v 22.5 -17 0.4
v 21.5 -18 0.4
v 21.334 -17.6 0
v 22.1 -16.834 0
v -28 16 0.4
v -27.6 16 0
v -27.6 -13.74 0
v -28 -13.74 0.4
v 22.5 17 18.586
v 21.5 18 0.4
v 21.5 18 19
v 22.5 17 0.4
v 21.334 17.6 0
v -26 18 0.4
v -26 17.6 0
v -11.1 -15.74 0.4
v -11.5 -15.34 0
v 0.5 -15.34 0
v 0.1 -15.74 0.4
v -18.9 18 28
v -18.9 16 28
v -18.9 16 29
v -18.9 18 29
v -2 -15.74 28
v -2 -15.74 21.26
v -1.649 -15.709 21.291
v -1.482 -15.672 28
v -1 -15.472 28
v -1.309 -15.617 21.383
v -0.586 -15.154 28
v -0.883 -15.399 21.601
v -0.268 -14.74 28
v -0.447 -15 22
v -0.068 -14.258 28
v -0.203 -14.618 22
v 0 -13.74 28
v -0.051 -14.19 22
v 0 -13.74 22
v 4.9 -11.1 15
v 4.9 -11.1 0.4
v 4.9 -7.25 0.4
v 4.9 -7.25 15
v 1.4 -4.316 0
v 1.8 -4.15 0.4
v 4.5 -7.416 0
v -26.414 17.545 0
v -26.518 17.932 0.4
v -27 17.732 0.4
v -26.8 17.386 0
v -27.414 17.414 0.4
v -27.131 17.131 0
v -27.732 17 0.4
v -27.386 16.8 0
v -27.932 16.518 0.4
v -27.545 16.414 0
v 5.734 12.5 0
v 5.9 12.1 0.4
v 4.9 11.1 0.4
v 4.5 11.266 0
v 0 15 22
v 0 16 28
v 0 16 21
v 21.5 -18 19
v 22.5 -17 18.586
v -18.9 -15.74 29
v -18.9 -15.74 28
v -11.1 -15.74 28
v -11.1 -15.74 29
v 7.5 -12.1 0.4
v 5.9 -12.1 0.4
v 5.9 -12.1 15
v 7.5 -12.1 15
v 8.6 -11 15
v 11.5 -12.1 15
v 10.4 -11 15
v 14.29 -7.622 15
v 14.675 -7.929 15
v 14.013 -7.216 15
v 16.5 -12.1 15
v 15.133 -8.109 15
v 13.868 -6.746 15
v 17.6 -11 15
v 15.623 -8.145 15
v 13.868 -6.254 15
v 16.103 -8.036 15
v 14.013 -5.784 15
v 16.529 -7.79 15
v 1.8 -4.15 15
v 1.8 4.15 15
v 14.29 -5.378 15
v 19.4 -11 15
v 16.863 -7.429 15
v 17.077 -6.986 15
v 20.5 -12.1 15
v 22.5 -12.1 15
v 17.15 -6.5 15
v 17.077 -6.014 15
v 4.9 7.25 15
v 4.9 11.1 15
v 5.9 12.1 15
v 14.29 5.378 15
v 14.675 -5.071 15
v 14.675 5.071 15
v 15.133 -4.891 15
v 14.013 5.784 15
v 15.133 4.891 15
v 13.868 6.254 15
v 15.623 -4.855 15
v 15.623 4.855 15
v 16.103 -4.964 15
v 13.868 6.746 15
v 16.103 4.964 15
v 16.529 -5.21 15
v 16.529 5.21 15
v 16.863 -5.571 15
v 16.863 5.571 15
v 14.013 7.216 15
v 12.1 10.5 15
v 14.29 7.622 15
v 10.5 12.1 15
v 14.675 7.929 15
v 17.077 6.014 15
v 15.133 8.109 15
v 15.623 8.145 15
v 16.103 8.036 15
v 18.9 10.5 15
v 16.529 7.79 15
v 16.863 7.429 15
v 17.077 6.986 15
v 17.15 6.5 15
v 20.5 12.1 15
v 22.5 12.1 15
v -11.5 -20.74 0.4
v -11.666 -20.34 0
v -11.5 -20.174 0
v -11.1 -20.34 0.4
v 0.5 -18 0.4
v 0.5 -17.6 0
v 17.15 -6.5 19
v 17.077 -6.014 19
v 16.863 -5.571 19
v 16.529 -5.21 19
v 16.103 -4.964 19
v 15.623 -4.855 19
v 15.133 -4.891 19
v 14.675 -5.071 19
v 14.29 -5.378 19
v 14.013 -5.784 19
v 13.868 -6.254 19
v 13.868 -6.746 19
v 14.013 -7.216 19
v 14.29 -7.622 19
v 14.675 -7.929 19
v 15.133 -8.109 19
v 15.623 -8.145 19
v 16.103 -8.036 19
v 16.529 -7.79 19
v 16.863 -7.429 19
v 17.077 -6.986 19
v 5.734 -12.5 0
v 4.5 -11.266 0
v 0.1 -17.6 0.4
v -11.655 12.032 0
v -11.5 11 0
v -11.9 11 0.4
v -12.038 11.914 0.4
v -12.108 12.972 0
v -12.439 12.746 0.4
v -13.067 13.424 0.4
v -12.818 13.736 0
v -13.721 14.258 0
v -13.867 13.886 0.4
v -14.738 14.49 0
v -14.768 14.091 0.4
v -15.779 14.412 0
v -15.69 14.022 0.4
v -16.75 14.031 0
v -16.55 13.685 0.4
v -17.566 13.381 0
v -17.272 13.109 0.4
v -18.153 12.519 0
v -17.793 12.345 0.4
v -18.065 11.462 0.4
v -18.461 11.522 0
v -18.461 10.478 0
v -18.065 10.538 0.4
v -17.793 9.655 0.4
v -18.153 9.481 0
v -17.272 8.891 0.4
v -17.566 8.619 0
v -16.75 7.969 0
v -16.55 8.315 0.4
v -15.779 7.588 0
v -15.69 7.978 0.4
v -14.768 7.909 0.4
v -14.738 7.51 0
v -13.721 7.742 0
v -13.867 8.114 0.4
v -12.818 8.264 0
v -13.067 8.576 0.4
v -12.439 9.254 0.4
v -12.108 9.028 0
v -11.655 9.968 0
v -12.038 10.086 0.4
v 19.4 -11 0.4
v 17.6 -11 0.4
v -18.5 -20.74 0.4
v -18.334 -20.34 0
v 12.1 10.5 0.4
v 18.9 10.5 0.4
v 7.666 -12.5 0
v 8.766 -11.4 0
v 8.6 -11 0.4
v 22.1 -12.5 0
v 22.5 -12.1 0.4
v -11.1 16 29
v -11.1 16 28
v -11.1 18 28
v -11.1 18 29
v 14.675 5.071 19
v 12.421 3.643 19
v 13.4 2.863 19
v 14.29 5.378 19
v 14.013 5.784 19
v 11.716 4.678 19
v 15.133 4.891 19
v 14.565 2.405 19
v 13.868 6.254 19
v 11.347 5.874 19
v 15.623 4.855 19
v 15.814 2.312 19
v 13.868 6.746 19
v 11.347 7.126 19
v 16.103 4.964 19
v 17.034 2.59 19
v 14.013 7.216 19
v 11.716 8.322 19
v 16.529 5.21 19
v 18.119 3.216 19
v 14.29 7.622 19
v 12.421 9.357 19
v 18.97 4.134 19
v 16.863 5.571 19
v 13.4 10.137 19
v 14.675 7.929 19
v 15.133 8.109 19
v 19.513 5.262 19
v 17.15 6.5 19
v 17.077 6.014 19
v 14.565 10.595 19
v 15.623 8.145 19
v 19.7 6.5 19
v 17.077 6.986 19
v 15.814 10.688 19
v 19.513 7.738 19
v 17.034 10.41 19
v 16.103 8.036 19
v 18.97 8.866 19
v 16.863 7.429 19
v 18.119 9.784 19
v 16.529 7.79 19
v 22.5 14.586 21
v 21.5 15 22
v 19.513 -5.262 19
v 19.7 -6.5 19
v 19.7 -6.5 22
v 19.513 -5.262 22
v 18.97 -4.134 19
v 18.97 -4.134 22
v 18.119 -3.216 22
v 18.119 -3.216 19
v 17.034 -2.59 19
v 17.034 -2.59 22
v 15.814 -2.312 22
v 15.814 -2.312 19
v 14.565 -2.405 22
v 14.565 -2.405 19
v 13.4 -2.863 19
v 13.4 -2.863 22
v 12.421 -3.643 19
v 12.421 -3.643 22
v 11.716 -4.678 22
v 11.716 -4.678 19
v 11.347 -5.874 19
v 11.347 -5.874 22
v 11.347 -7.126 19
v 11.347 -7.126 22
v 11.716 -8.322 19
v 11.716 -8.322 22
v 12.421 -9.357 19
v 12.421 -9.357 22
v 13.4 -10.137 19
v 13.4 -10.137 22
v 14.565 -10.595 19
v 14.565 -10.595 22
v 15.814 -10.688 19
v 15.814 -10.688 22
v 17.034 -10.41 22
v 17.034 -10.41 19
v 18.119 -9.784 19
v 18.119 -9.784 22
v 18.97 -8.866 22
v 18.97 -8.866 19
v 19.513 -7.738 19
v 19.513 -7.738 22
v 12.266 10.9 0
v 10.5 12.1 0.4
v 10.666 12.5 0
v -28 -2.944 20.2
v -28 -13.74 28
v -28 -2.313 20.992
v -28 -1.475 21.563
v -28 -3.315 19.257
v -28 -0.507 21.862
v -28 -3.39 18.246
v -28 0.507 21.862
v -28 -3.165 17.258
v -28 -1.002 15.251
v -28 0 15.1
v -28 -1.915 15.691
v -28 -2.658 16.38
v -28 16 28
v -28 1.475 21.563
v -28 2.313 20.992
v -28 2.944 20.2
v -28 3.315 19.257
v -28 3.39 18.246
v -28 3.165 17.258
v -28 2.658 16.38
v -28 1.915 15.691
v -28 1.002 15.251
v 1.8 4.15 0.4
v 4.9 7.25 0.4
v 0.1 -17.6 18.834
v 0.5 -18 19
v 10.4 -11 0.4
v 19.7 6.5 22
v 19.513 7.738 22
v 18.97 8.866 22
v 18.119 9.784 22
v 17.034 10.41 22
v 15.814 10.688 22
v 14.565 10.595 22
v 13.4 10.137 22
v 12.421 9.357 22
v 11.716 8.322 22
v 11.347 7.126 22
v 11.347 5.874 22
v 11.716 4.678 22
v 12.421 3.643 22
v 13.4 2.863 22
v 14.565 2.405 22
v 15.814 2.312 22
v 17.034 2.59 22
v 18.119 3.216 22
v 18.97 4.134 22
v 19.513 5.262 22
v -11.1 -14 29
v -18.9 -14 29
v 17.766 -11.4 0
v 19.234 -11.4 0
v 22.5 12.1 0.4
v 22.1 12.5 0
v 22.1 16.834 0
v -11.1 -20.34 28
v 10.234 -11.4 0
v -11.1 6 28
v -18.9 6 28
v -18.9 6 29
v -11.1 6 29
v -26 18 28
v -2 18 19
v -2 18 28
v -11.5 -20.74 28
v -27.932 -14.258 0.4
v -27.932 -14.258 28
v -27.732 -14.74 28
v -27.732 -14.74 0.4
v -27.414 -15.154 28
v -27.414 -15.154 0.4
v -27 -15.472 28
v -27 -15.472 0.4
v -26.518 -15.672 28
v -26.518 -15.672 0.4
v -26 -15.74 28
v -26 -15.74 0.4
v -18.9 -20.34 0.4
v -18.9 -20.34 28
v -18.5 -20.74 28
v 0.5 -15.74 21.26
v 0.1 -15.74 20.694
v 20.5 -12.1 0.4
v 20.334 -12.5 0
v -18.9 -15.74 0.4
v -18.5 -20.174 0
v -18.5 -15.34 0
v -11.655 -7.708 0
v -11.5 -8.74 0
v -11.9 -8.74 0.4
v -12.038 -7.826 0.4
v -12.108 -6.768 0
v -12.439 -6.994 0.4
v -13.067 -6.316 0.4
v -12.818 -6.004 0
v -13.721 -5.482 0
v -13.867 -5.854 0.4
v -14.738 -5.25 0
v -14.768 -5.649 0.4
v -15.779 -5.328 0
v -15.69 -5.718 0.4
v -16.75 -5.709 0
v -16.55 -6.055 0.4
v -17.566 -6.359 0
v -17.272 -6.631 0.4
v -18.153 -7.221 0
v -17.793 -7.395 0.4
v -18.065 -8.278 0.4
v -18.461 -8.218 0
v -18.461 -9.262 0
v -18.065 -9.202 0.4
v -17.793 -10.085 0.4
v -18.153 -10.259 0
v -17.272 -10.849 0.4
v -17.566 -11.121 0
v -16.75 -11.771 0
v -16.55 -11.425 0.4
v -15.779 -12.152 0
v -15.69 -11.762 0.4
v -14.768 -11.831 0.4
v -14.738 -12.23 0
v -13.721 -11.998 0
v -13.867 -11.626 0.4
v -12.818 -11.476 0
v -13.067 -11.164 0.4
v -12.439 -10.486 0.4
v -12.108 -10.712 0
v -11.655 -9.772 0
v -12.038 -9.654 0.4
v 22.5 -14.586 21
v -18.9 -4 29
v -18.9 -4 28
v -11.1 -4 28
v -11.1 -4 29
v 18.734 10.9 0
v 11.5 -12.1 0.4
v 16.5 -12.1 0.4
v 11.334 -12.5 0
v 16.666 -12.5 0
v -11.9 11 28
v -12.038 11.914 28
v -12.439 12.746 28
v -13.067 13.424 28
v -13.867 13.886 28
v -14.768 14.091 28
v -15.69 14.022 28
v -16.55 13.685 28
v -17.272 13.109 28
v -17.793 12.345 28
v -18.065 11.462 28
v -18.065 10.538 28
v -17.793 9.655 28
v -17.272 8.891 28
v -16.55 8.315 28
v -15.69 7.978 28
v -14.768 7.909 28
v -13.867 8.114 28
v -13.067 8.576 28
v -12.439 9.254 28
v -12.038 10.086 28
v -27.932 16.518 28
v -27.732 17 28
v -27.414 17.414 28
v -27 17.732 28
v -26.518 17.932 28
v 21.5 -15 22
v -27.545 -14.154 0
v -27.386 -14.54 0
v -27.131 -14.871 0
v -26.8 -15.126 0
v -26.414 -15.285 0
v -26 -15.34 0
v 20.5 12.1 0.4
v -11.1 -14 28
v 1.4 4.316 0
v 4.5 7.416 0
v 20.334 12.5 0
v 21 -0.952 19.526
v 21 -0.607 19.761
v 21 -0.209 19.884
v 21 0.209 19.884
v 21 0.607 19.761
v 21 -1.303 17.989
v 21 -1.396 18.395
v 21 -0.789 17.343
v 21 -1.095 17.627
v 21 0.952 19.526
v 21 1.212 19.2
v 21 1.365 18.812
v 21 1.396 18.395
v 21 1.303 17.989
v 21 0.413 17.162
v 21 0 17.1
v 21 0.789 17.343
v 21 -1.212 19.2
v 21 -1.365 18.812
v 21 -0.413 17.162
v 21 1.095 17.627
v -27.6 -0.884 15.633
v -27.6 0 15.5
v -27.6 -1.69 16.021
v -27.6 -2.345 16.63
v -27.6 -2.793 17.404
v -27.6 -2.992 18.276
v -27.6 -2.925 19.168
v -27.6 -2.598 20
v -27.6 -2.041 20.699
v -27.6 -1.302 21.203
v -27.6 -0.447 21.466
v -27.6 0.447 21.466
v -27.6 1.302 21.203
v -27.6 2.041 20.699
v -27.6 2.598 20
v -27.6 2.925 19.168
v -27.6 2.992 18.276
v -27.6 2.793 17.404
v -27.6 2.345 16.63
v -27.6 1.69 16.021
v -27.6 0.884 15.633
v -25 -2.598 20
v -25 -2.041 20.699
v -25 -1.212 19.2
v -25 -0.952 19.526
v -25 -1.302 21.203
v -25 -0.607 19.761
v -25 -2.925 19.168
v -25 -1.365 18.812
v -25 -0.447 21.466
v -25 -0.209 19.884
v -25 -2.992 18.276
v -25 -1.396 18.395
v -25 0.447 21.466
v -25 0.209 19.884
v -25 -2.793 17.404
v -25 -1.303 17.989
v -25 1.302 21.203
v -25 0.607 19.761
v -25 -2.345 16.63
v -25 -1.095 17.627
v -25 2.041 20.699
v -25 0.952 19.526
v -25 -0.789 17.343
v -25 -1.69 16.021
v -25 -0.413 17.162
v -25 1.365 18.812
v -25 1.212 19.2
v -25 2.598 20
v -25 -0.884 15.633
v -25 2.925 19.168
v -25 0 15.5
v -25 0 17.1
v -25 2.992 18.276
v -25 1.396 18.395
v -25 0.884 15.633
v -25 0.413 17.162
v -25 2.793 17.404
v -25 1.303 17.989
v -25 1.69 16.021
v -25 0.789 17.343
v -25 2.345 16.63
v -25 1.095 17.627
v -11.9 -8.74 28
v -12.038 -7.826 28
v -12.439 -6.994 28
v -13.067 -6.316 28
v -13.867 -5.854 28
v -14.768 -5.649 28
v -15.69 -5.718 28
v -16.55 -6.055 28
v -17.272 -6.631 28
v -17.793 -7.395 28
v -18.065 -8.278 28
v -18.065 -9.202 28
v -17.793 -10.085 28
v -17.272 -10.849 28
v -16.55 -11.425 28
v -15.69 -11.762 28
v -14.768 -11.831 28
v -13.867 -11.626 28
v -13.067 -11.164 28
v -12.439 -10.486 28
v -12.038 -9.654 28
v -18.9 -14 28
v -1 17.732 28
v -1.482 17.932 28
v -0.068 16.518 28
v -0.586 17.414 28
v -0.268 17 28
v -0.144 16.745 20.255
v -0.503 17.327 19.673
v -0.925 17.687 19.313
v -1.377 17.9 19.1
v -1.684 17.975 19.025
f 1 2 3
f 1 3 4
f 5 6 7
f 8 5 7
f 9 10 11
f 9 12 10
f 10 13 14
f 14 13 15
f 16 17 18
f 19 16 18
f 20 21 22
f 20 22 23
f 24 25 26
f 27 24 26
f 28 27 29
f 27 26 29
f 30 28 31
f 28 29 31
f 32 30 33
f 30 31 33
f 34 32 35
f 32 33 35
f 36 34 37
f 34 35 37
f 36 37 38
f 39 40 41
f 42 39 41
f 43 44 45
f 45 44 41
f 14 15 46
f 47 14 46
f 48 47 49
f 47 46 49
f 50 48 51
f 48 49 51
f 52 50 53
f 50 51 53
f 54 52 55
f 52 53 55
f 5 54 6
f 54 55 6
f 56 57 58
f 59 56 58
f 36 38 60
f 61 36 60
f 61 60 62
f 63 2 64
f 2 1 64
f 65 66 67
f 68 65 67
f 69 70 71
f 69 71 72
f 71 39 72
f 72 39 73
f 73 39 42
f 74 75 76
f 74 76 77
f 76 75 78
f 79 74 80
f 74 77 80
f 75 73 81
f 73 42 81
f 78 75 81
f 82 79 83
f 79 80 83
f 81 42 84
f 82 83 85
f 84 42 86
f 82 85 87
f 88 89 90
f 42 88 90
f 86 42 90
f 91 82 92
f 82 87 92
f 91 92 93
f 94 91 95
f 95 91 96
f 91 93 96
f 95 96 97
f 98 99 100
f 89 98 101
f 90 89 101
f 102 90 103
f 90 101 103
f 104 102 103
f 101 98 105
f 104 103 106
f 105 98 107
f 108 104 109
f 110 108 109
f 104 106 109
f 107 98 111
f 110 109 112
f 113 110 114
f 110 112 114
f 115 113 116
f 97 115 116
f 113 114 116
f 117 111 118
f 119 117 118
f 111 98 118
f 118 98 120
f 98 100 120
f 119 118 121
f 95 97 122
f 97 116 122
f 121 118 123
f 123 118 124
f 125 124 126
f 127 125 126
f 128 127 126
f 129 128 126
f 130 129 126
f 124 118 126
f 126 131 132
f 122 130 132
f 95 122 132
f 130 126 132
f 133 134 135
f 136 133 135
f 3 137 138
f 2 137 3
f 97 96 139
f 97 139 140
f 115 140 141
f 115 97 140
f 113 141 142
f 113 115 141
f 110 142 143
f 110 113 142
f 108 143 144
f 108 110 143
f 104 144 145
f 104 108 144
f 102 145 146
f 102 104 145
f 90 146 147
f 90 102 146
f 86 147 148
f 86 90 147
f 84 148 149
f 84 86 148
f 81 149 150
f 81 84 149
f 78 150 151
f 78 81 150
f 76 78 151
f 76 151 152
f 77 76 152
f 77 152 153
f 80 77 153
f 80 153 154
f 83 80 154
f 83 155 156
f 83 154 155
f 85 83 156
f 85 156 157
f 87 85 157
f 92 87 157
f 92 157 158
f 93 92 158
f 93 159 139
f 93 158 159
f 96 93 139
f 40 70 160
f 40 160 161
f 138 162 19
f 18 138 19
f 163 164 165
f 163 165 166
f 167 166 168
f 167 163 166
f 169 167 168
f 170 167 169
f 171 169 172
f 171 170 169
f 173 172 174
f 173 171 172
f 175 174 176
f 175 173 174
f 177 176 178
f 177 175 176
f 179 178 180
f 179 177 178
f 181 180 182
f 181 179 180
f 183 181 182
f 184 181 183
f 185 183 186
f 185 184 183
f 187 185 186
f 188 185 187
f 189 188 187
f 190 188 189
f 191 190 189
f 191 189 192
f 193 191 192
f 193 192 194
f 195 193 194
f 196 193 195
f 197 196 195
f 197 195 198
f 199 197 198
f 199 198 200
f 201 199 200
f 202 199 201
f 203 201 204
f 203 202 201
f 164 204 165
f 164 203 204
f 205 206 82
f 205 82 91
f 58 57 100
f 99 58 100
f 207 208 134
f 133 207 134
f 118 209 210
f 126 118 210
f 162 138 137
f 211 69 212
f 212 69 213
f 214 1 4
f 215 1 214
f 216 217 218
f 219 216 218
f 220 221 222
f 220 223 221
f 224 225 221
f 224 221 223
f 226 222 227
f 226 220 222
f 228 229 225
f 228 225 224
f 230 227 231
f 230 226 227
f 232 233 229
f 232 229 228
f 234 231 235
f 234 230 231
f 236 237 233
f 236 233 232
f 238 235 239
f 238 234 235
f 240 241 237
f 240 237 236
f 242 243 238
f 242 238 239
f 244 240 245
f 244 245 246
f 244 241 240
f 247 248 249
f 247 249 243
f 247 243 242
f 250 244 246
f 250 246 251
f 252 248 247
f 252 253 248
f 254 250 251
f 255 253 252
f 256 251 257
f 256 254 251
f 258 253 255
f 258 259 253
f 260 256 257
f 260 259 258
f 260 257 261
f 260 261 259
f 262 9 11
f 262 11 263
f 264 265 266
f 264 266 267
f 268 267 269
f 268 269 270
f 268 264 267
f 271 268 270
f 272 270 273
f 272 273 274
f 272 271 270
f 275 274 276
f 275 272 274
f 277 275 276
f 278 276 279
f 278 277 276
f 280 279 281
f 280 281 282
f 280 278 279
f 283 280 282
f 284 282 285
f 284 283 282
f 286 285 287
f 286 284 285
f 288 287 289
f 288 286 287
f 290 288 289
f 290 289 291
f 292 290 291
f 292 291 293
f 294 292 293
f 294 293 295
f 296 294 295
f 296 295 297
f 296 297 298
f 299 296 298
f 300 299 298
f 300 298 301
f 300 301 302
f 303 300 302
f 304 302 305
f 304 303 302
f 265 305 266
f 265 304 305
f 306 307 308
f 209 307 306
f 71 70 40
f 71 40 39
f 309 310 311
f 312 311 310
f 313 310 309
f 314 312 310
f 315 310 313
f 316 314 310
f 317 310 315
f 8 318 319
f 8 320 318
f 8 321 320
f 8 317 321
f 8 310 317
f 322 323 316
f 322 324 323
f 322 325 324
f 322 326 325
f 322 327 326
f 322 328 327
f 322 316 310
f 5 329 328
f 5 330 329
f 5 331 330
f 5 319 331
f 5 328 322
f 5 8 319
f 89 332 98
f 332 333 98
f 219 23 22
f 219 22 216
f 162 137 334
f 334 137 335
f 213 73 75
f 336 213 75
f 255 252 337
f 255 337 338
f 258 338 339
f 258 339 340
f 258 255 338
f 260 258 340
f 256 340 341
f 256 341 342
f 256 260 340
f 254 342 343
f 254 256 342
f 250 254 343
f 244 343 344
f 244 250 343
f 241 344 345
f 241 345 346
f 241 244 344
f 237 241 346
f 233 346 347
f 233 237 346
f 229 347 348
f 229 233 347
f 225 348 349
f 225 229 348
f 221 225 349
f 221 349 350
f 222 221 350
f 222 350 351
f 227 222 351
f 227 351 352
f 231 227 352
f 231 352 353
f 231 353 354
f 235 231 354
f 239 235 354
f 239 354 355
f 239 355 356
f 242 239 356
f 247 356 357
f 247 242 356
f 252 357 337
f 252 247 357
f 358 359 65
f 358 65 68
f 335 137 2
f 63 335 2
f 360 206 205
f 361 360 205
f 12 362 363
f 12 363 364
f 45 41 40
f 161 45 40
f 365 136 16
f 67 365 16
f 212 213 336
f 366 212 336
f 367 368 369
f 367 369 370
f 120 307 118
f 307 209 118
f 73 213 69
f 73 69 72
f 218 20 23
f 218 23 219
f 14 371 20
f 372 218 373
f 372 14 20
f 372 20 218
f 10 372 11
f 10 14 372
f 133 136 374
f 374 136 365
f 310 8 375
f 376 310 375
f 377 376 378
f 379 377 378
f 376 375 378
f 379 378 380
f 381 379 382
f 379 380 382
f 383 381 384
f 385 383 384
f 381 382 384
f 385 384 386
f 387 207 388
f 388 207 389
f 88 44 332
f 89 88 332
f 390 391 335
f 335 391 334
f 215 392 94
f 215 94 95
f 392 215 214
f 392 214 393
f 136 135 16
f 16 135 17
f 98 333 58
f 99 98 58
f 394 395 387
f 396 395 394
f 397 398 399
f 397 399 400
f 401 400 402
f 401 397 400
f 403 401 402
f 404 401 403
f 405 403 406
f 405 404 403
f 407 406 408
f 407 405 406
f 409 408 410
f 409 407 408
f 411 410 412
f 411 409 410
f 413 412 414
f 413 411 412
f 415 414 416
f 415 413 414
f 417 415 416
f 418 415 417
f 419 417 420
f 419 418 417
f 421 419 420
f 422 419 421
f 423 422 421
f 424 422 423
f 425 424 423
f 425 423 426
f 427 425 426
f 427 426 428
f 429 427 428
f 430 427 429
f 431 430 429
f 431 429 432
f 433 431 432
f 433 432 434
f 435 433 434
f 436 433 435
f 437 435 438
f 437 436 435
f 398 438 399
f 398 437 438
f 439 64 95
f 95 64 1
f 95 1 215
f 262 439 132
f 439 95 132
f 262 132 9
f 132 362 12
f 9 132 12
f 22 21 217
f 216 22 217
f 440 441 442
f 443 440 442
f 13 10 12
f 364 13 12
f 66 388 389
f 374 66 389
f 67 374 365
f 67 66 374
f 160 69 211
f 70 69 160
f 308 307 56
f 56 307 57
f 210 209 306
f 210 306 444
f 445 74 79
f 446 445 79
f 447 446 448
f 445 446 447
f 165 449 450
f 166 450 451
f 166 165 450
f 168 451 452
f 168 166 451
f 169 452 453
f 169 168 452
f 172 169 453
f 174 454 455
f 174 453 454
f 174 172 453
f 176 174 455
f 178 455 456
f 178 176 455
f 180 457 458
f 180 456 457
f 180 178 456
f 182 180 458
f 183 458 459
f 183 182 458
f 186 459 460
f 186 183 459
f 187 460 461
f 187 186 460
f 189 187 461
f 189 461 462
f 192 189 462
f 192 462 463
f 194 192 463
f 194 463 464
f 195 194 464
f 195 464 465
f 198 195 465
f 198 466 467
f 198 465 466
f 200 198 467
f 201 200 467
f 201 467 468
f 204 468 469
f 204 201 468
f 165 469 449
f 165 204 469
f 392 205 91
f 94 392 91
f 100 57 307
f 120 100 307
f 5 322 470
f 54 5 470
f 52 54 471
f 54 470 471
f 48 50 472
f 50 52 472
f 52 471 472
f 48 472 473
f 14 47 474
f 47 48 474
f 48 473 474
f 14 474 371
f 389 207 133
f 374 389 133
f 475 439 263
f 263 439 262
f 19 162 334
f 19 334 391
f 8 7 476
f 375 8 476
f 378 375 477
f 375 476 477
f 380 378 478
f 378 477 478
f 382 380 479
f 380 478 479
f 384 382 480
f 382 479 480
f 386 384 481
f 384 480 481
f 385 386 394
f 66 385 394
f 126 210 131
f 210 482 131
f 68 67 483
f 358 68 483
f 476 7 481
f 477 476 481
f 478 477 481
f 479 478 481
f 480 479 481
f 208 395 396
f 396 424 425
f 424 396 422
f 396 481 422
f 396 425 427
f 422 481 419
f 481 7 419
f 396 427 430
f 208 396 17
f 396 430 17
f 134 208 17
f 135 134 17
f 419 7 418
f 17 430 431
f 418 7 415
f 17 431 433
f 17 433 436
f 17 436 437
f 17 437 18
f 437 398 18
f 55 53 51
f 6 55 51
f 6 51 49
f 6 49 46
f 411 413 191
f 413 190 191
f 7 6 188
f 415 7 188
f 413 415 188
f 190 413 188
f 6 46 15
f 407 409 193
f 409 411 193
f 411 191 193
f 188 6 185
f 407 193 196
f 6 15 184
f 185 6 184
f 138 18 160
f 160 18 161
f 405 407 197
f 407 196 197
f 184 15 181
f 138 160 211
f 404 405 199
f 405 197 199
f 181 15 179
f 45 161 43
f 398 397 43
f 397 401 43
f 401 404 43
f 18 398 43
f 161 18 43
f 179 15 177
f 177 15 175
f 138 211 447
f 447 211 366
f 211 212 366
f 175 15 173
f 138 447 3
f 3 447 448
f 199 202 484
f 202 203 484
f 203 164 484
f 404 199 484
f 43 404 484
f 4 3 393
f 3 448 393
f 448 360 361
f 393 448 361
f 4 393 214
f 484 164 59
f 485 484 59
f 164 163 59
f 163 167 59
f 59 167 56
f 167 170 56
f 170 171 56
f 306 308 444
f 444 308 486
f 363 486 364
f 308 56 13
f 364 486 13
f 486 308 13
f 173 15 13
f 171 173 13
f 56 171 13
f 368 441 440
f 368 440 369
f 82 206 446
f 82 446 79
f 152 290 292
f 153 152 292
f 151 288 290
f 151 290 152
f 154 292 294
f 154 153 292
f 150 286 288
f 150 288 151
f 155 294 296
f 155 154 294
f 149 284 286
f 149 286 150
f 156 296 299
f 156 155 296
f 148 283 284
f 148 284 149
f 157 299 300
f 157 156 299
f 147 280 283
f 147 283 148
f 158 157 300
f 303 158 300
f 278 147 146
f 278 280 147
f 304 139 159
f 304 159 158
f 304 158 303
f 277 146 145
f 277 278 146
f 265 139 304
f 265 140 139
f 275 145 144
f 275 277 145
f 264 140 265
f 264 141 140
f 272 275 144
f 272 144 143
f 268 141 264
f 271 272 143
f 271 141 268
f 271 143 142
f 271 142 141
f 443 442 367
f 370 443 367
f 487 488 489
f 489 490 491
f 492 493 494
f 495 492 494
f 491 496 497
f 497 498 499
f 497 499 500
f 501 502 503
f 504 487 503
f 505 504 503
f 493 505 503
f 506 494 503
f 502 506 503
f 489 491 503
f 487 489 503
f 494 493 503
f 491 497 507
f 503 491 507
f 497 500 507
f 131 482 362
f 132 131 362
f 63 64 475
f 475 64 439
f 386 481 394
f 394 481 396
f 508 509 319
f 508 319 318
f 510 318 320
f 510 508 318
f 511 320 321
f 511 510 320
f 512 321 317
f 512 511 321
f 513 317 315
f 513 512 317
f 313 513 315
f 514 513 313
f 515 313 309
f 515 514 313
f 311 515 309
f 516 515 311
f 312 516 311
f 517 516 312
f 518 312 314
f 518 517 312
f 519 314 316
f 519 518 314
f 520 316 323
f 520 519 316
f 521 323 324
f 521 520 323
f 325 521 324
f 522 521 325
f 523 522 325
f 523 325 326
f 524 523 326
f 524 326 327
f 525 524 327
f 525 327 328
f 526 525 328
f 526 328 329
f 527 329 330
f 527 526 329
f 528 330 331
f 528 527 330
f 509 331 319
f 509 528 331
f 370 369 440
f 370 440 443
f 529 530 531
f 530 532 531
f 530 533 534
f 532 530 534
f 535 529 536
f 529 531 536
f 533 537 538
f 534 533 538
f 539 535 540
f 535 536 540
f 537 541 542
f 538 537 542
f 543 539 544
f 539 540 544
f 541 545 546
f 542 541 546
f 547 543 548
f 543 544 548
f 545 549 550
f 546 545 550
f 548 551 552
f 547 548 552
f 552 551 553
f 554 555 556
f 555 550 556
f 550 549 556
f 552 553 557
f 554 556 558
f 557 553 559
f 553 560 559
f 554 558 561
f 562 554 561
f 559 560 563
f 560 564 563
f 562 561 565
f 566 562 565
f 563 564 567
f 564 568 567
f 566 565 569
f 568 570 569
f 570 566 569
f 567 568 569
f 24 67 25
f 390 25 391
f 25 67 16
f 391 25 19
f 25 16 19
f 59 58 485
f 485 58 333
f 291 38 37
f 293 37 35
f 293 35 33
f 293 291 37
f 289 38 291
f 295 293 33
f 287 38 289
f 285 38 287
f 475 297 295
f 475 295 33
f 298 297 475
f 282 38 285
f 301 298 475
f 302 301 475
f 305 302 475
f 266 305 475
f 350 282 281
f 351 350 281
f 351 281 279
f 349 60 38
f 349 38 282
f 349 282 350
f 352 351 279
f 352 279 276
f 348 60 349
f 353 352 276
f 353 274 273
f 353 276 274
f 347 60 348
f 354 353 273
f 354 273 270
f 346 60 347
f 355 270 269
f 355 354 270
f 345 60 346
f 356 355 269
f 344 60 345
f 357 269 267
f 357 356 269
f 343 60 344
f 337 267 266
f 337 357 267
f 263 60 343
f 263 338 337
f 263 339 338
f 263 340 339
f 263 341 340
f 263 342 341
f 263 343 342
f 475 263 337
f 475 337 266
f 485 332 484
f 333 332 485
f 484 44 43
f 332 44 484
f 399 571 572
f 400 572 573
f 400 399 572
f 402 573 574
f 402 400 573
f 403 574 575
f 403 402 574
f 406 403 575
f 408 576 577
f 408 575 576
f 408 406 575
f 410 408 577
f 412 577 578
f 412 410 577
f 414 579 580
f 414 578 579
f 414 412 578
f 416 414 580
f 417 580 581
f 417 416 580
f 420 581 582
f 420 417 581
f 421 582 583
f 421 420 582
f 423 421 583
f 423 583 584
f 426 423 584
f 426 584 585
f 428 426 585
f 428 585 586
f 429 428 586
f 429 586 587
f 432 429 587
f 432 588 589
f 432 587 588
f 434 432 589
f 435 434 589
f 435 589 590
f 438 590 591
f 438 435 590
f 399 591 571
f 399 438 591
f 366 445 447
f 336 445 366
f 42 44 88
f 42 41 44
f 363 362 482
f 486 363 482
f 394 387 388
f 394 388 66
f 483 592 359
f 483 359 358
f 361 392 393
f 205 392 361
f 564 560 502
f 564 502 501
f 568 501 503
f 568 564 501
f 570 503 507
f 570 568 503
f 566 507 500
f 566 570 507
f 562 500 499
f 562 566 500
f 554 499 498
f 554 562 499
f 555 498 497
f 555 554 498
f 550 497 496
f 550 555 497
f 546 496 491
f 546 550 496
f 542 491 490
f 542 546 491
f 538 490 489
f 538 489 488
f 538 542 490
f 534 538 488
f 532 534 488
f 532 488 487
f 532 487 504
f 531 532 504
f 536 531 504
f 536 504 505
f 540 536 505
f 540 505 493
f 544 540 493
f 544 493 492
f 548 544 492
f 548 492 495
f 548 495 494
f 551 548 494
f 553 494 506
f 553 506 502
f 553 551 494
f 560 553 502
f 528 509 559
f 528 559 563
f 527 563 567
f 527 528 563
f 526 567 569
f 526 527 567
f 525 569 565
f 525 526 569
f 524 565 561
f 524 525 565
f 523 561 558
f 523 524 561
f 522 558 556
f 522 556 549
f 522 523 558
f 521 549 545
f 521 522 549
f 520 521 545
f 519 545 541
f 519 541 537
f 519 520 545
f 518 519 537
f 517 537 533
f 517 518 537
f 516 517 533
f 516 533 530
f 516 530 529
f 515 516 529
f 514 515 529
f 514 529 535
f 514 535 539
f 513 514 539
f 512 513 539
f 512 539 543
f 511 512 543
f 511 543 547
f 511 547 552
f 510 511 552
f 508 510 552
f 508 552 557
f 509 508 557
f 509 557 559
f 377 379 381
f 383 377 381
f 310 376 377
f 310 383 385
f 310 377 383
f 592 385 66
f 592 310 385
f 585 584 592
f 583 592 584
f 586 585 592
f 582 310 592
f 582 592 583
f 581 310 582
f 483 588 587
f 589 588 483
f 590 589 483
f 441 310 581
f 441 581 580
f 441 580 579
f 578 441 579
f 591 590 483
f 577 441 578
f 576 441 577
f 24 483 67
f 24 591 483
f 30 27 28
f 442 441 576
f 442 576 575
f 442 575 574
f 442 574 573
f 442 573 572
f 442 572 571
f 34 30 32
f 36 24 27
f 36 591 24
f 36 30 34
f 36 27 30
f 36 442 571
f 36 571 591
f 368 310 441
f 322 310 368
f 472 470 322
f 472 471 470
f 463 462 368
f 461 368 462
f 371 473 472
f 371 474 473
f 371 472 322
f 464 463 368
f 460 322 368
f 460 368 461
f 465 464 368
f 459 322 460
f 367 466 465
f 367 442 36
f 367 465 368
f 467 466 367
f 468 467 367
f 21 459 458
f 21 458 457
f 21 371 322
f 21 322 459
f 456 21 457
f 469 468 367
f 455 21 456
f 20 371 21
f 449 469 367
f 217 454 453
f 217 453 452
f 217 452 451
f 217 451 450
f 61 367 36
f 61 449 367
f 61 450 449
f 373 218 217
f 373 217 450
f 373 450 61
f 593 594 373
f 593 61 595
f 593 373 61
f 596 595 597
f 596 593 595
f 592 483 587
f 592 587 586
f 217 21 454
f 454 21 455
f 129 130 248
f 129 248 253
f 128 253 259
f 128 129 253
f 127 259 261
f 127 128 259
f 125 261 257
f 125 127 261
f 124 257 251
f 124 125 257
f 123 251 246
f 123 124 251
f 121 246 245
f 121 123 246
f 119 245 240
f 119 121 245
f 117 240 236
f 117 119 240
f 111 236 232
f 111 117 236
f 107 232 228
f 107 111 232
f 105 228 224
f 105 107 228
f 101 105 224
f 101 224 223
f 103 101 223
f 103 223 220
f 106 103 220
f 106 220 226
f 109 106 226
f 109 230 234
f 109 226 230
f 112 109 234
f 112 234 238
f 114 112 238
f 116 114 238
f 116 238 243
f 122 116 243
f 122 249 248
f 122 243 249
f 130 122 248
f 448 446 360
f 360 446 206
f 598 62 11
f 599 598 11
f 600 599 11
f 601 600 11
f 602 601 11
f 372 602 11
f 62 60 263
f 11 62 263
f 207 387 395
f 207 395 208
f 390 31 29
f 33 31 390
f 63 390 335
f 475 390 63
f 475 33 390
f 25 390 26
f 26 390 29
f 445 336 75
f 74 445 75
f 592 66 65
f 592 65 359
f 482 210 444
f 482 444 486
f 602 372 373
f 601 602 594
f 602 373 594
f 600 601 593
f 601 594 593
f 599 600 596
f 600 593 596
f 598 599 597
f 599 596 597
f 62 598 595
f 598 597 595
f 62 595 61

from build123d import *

# Parameters (mm, degrees)
BOX039_W                 = 10
BOX039_H                 = 10
BOX039_DEPTH             = 10
BOX040_W                 = 10
BOX040_H                 = 10
BOX040_DEPTH             = 10
CYLINDER027_R            = 1.4
CYLINDER027_DEPTH        = 46
CYLINDER028_R            = 3
CYLINDER028_DEPTH        = 4
CYLINDER026_R            = 3.1
CYLINDER026_DEPTH        = 32
CYLINDER_R               = 3.1
CYLINDER_DEPTH           = 32
BOX035_W                 = 7.8
BOX035_H                 = 6
BOX035_DEPTH             = 28
CHAMFER003068008_SIZE    = 0.4
BOX031_W                 = 7.8
BOX031_H                 = 11.74
BOX031_DEPTH             = 1
BOX032_W                 = 7.8
BOX032_H                 = 3
BOX032_DEPTH             = 1
BOX030_W                 = 7.8
BOX030_H                 = 3
BOX030_DEPTH             = 1
BOX033_W                 = 60
BOX033_H                 = 10
BOX033_DEPTH             = 30
BOX_W                    = 28
BOX_H                    = 36
BOX_DEPTH                = 28
FILLET_R                 = 2
BOX038_W                 = 4
BOX038_H                 = 14.5
BOX038_DEPTH             = 15
CHAMFER003068009_SIZE    = 3.1
BOX034_W                 = 10
BOX034_H                 = 10
BOX034_DEPTH             = 28
CYLINDER024_R            = 1.65
CYLINDER024_DEPTH        = 10
CYLINDER025_R            = 1.65
CYLINDER025_DEPTH        = 10
CYLINDER023_R            = 4.2
CYLINDER023_DEPTH        = 3
CYLINDER022_R            = 4.2
CYLINDER022_DEPTH        = 3
BOX027_W                 = 13
BOX027_H                 = 10
BOX027_DEPTH             = 19
BOX021_W                 = 10
BOX021_H                 = 3
BOX021_DEPTH             = 15
BOX022_W                 = 4
BOX022_H                 = 3
BOX022_DEPTH             = 15
BOX026_W                 = 4
BOX026_H                 = 3
BOX026_DEPTH             = 15
CHAMFER003060_SIZE       = 1.6
BOX015_W                 = 22.2
BOX015_H                 = 24.2
BOX015_DEPTH             = 18
CHAMFER003042_SIZE       = 1
BOX018_W                 = 22.5
BOX018_H                 = 36
BOX018_DEPTH             = 22
CHAMFER_SIZE             = 3
CHAMFER003061_SIZE       = 1
BOX029_W                 = 3
BOX029_H                 = 36
BOX029_DEPTH             = 22
CHAMFER003062_SIZE       = 3
CHAMFER003068012002_SIZE = 0.4


with BuildPart() as cube037:
    # Box039 → Box039 (new body)
    with BuildSketch(Plane(origin=(-20, 6, 28), x_dir=(1, 0, 0), z_dir=(0, 0, 1))):
        with Locations((5, 5)):
            Rectangle(BOX039_W, BOX039_H)
    extrude(amount=BOX039_DEPTH)


with BuildPart() as fusion013005011029006008001011:
    # Box040 → Box040 (new body)
    with BuildSketch(Plane(origin=(-20, -14, 28), x_dir=(1, 0, 0), z_dir=(0, 0, 1))):
        with Locations((5, 5)):
            Rectangle(BOX040_W, BOX040_H)
    extrude(amount=BOX040_DEPTH)

    # Fusion013005011029006008001011: union Cube037
    add(cube037.part)


with BuildPart() as cylinder027:
    # Cylinder027 → Cylinder027 (new body)
    with BuildSketch(Plane(origin=(-25, 0, 18.5), x_dir=(0, 0, -1), z_dir=(1, 0, 0))):
        Circle(CYLINDER027_R)
    extrude(amount=CYLINDER027_DEPTH)


with BuildPart() as fusion013005011029006008001010:
    # Cylinder028 → Cylinder028 (new body)
    with BuildSketch(Plane(origin=(-29, 0, 18.5), x_dir=(0, 0, -1), z_dir=(1, 0, 0))):
        Circle(CYLINDER028_R)
    extrude(amount=CYLINDER028_DEPTH)

    # Fusion013005011029006008001010: union Cylinder027
    add(cylinder027.part)


with BuildPart() as cylinder026:
    # Cylinder026 → Cylinder026 (new body)
    with BuildSketch(Plane(origin=(-15, -8.74, 0), x_dir=(1, 0, 0), z_dir=(0, 0, 1))):
        Circle(CYLINDER026_R)
    extrude(amount=CYLINDER026_DEPTH)


with BuildPart() as fusion013005011029006006:
    # Cylinder → Cylinder (new body)
    with BuildSketch(Plane(origin=(-15, 11, 0), x_dir=(1, 0, 0), z_dir=(0, 0, 1))):
        Circle(CYLINDER_R)
    extrude(amount=CYLINDER_DEPTH)

    # Fusion013005011029006006: union Cylinder026
    add(cylinder026.part)


with BuildPart() as chamfer003068008:
    # Box035 → Box035 (new body)
    with BuildSketch(Plane(origin=(-18.9, -20.74, 0), x_dir=(1, 0, 0), z_dir=(0, 0, 1))):
        with Locations((3.9, 3)):
            Rectangle(BOX035_W, BOX035_H)
    extrude(amount=BOX035_DEPTH)

    # Chamfer003068008
    chamfer003068008_edges = [chamfer003068008.edges().sort_by_distance(p)[0] for p in [
        (-18.9, -20.74, 14),
        (-11.1, -20.74, 14),
    ]]
    chamfer(chamfer003068008_edges, length=CHAMFER003068008_SIZE)


with BuildPart() as cube029:
    # Box031 → Box031 (new body)
    with BuildSketch(Plane(origin=(-18.9, -4.74, 25), x_dir=(1, 0, 0), z_dir=(0, 0, 1))):
        with Locations((3.9, 5.87)):
            Rectangle(BOX031_W, BOX031_H)
    extrude(amount=BOX031_DEPTH)


with BuildPart() as cube030:
    # Box032 → Box032 (new body)
    with BuildSketch(Plane(origin=(-18.9, 15, 25), x_dir=(1, 0, 0), z_dir=(0, 0, 1))):
        with Locations((3.9, 1.5)):
            Rectangle(BOX032_W, BOX032_H)
    extrude(amount=BOX032_DEPTH)


with BuildPart() as fusion013005011029006004:
    # Box030 → Box030 (new body)
    with BuildSketch(Plane(origin=(-18.9, -15.74, 25), x_dir=(1, 0, 0), z_dir=(0, 0, 1))):
        with Locations((3.9, 1.5)):
            Rectangle(BOX030_W, BOX030_H)
    extrude(amount=BOX030_DEPTH)

    # Fusion013005011029006004: union Cube029, Cube030
    add(cube029.part)
    add(cube030.part)


with BuildPart() as fusion013005011029006004_1:
    # Fusion013005011029006004 placement: moved
    add(fusion013005011029006004.part.moved(Location((0, 0, 3))))


with BuildPart() as cube031:
    # Box033 → Box033 (new body)
    with BuildSketch(Plane(origin=(-31.48, -25.74, 0), x_dir=(1, 0, 0), z_dir=(0, 0, 1))):
        with Locations((30, 5)):
            Rectangle(BOX033_W, BOX033_H)
    extrude(amount=BOX033_DEPTH)


with BuildPart() as fusion013005011029006008001007:
    # Box → Box (new body)
    with BuildSketch(Plane(origin=(-28, -18, 0), x_dir=(1, 0, 0), z_dir=(0, 0, 1))):
        with Locations((14, 18)):
            Rectangle(BOX_W, BOX_H)
    extrude(amount=BOX_DEPTH)

    # Cut001001036007: cut Cube031
    add(cube031.part, mode=Mode.SUBTRACT)

    # Fillet
    fillet_edges = [fusion013005011029006008001007.edges().sort_by_distance(p)[0] for p in [
        (-28, 18, 14),
        (-28, -15.74, 14),
        (0, 18, 14),
        (0, -15.74, 14),
    ]]
    fillet(fillet_edges, radius=FILLET_R)

    # Fusion013005011029006008001007: union Chamfer003068008, Fusion013005011029006004
    add(chamfer003068008.part)
    add(fusion013005011029006004_1.part)


with BuildPart() as chamfer003068009:
    # Box038 → Box038 (new body)
    with BuildSketch(Plane(origin=(1.8, -7.25, 0), x_dir=(1, 0, 0), z_dir=(0, 0, 1))):
        with Locations((2, 7.25)):
            Rectangle(BOX038_W, BOX038_H)
    extrude(amount=BOX038_DEPTH)

    # Chamfer003068009
    chamfer003068009_edges = [chamfer003068009.edges().sort_by_distance(p)[0] for p in [
        (1.8, -7.25, 7.5),
        (1.8, 7.25, 7.5),
    ]]
    chamfer(chamfer003068009_edges, length=CHAMFER003068009_SIZE)


with BuildPart() as cube032:
    # Box034 → Box034 (new body)
    with BuildSketch(Plane(origin=(-9.9, -25.74, 0), x_dir=(1, 0, 0), z_dir=(0, 0, 1))):
        with Locations((5, 5)):
            Rectangle(BOX034_W, BOX034_H)
    extrude(amount=BOX034_DEPTH)


with BuildPart() as cylinder024:
    # Cylinder024 → Cylinder024 (new body)
    with BuildSketch(Plane(origin=(15, 6.5, 12), x_dir=(1, 0, 0), z_dir=(0, 0, 1))):
        Circle(CYLINDER024_R)
    extrude(amount=CYLINDER024_DEPTH)


with BuildPart() as fusion013005011016:
    # Cylinder025 → Cylinder025 (new body)
    with BuildSketch(Plane(origin=(15, -6.5, 12), x_dir=(1, 0, 0), z_dir=(0, 0, 1))):
        Circle(CYLINDER025_R)
    extrude(amount=CYLINDER025_DEPTH)

    # Fusion013005011016: union Cylinder024
    add(cylinder024.part)


with BuildPart() as fusion013005011016_1:
    # Fusion013005011016 placement: moved
    add(fusion013005011016.part.moved(Location((0.5, 0, 0))))


with BuildPart() as cylinder023:
    # Cylinder023 → Cylinder023 (new body)
    with BuildSketch(Plane(origin=(15.5, -6.5, 19), x_dir=(1, 0, 0), z_dir=(0, 0, 1))):
        Circle(CYLINDER023_R)
    extrude(amount=CYLINDER023_DEPTH)


with BuildPart() as fusion013005011027:
    # Cylinder022 → Cylinder022 (new body)
    with BuildSketch(Plane(origin=(15.5, 6.5, 19), x_dir=(1, 0, 0), z_dir=(0, 0, 1))):
        Circle(CYLINDER022_R)
    extrude(amount=CYLINDER022_DEPTH)

    # Fusion013005011026: union Cylinder023
    add(cylinder023.part)

    # Fusion013005011027: union Fusion013005011016
    add(fusion013005011016_1.part)


with BuildPart() as cube025:
    # Box027 → Box027 (new body)
    with BuildSketch(Plane(origin=(6, -11, 0), x_dir=(1, 0, 0), z_dir=(0, 0, 1))):
        with Locations((6.5, 5)):
            Rectangle(BOX027_W, BOX027_H)
    extrude(amount=BOX027_DEPTH)


with BuildPart() as cube021:
    # Box021 → Box021 (new body)
    with BuildSketch(Plane(origin=(10, 10.5, 0), x_dir=(1, 0, 0), z_dir=(0, 0, 1))):
        with Locations((5, 1.5)):
            Rectangle(BOX021_W, BOX021_H)
    extrude(amount=BOX021_DEPTH)


with BuildPart() as cube022:
    # Box022 → Box022 (new body)
    with BuildSketch(Plane(origin=(7, -13.5, 0), x_dir=(1, 0, 0), z_dir=(0, 0, 1))):
        with Locations((2, 1.5)):
            Rectangle(BOX022_W, BOX022_H)
    extrude(amount=BOX022_DEPTH)


with BuildPart() as cut001001032:
    # Box026 → Box026 (new body)
    with BuildSketch(Plane(origin=(16, -13.5, 0), x_dir=(1, 0, 0), z_dir=(0, 0, 1))):
        with Locations((2, 1.5)):
            Rectangle(BOX026_W, BOX026_H)
    extrude(amount=BOX026_DEPTH)

    # Fusion013005011025: union Cube021, Cube022
    add(cube021.part)
    add(cube022.part)

    # Chamfer003060
    chamfer003060_edges = [cut001001032.edges().sort_by_distance(p)[0] for p in [
        (16, -10.5, 7.5),
        (20, -10.5, 7.5),
        (10, 10.5, 7.5),
        (20, 10.5, 7.5),
        (7, -10.5, 7.5),
        (11, -10.5, 7.5),
    ]]
    chamfer(chamfer003060_edges, length=CHAMFER003060_SIZE)

    # Cut001001032: cut Cube025
    add(cube025.part, mode=Mode.SUBTRACT)


with BuildPart() as cut001001032_1:
    # Cut001001032 placement: moved
    add(cut001001032.part.moved(Location((0.5, 0, 0))))


with BuildPart() as chamfer003042:
    # Box015 → Box015 (new body)
    with BuildSketch(Plane(origin=(4.4, -12.1, 0), x_dir=(1, 0, 0), z_dir=(0, 0, 1))):
        with Locations((11.1, 12.1)):
            Rectangle(BOX015_W, BOX015_H)
    extrude(amount=BOX015_DEPTH)

    # Chamfer003042
    chamfer003042_edges = [chamfer003042.edges().sort_by_distance(p)[0] for p in [
        (4.4, -12.1, 9),
        (4.4, 12.1, 9),
    ]]
    chamfer(chamfer003042_edges, length=CHAMFER003042_SIZE)


with BuildPart() as chamfer003042_1:
    # Chamfer003042 placement: moved
    add(chamfer003042.part.moved(Location((0.5, 0, -3))))


with BuildPart() as cut001001033:
    # Box018 → Box018 (new body)
    with BuildSketch(Plane(origin=(0, -18, 0), x_dir=(1, 0, 0), z_dir=(0, 0, 1))):
        with Locations((11.25, 18)):
            Rectangle(BOX018_W, BOX018_H)
    extrude(amount=BOX018_DEPTH)

    # Cut: cut Chamfer003042
    add(chamfer003042_1.part, mode=Mode.SUBTRACT)

    # Fusion: union Cut001001032
    add(cut001001032_1.part)

    # Chamfer
    chamfer_edges = [cut001001033.edges().sort_by_distance(p)[0] for p in [
        (11.25, -18, 22),
        (11.25, 18, 22),
    ]]
    chamfer(chamfer_edges, length=CHAMFER_SIZE)

    # Chamfer003061
    chamfer003061_edges = [cut001001033.edges().sort_by_distance(p)[0] for p in [
        (22.5, -18, 9.5),
        (22.5, -16.5, 20.5),
        (22.5, 0, 22),
        (22.5, 18, 9.5),
        (22.5, 16.5, 20.5),
    ]]
    chamfer(chamfer003061_edges, length=CHAMFER003061_SIZE)

    # Cut001001033: cut Fusion013005011027
    add(fusion013005011027.part, mode=Mode.SUBTRACT)


with BuildPart() as cut001001036010002002002:
    # Box029 → Box029 (new body)
    with BuildSketch(Plane(origin=(-2, -18, 0), x_dir=(1, 0, 0), z_dir=(0, 0, 1))):
        with Locations((1.5, 18)):
            Rectangle(BOX029_W, BOX029_H)
    extrude(amount=BOX029_DEPTH)

    # Chamfer003062
    chamfer003062_edges = [cut001001036010002002002.edges().sort_by_distance(p)[0] for p in [
        (-0.5, -18, 22),
        (-0.5, 18, 22),
    ]]
    chamfer(chamfer003062_edges, length=CHAMFER003062_SIZE)

    # Fusion013005011029005: union Cut001001033
    add(cut001001033.part)

    # Cut001001035: cut Cube032
    add(cube032.part, mode=Mode.SUBTRACT)

    # Cut001001036008: cut Chamfer003068009
    add(chamfer003068009.part, mode=Mode.SUBTRACT)

    # Fusion013005011029006008001008: union Fusion013005011029006008001007
    add(fusion013005011029006008001007.part)

    # Cut001001036009: cut Fusion013005011029006006
    add(fusion013005011029006006.part, mode=Mode.SUBTRACT)

    # Cut001001036010002002: cut Fusion013005011029006008001010
    add(fusion013005011029006008001010.part, mode=Mode.SUBTRACT)

    # Chamfer003068012002
    chamfer003068012002_edges = [cut001001036010002002002.edges().sort_by_distance(p)[0] for p in [
        (8.2, 12.1, 0),
        (5.4, 11.6, 0),
        (4.9, 9.175, 0),
        (3.35, 5.7, 0),
        (1.8, 0, 0),
        (3.35, -5.7, 0),
        (4.9, -9.175, 0),
        (5.4, -11.6, 0),
        (6.7, -12.1, 0),
        (11.3, 11.3, 0),
        (8.05, -11.55, 0),
        (15.5, 10.5, 0),
        (22.5, -14.55, 0),
        (22.5, 14.55, 0),
        (21.5, 12.1, 0),
        (21.5, -12.1, 0),
        (22, -17.5, 0),
        (22, 17.5, 0),
        (19.7, 11.3, 0),
        (19.95, -11.55, 0),
        (18.5, -11, 0),
        (14, -12.1, 0),
        (17.05, -11.55, 0),
        (10.95, -11.55, 0),
        (9.5, -11, 0),
        (10.8, -18, 0),
        (0.1, -16.87, 0),
        (-5.5, -15.74, 0),
        (-11.1, -18.04, 0),
        (-11.3, -20.54, 0),
        (-15, -20.74, 0),
        (-18.7, -20.54, 0),
        (-18.9, -18.04, 0),
        (-22.45, -15.74, 0),
        (-27.414214, -15.154214, 0),
        (-28, 1.13, 0),
        (-27.414214, 17.414214, 0),
        (-2.25, 18, 0),
        (-18.1, -8.74, 0),
        (-18.1, 11, 0),
        (0.1, -18, 9.5),
        (0.1, -16.87, 20.13),
        (-28, 0, 21.5),
    ]]
    chamfer(chamfer003068012002_edges, length=CHAMFER003068012002_SIZE)

    # Cut001001036010002002002: cut Fusion013005011029006008001011
    add(fusion013005011029006008001011.part, mode=Mode.SUBTRACT)


solid = cut001001036010002002002.part
